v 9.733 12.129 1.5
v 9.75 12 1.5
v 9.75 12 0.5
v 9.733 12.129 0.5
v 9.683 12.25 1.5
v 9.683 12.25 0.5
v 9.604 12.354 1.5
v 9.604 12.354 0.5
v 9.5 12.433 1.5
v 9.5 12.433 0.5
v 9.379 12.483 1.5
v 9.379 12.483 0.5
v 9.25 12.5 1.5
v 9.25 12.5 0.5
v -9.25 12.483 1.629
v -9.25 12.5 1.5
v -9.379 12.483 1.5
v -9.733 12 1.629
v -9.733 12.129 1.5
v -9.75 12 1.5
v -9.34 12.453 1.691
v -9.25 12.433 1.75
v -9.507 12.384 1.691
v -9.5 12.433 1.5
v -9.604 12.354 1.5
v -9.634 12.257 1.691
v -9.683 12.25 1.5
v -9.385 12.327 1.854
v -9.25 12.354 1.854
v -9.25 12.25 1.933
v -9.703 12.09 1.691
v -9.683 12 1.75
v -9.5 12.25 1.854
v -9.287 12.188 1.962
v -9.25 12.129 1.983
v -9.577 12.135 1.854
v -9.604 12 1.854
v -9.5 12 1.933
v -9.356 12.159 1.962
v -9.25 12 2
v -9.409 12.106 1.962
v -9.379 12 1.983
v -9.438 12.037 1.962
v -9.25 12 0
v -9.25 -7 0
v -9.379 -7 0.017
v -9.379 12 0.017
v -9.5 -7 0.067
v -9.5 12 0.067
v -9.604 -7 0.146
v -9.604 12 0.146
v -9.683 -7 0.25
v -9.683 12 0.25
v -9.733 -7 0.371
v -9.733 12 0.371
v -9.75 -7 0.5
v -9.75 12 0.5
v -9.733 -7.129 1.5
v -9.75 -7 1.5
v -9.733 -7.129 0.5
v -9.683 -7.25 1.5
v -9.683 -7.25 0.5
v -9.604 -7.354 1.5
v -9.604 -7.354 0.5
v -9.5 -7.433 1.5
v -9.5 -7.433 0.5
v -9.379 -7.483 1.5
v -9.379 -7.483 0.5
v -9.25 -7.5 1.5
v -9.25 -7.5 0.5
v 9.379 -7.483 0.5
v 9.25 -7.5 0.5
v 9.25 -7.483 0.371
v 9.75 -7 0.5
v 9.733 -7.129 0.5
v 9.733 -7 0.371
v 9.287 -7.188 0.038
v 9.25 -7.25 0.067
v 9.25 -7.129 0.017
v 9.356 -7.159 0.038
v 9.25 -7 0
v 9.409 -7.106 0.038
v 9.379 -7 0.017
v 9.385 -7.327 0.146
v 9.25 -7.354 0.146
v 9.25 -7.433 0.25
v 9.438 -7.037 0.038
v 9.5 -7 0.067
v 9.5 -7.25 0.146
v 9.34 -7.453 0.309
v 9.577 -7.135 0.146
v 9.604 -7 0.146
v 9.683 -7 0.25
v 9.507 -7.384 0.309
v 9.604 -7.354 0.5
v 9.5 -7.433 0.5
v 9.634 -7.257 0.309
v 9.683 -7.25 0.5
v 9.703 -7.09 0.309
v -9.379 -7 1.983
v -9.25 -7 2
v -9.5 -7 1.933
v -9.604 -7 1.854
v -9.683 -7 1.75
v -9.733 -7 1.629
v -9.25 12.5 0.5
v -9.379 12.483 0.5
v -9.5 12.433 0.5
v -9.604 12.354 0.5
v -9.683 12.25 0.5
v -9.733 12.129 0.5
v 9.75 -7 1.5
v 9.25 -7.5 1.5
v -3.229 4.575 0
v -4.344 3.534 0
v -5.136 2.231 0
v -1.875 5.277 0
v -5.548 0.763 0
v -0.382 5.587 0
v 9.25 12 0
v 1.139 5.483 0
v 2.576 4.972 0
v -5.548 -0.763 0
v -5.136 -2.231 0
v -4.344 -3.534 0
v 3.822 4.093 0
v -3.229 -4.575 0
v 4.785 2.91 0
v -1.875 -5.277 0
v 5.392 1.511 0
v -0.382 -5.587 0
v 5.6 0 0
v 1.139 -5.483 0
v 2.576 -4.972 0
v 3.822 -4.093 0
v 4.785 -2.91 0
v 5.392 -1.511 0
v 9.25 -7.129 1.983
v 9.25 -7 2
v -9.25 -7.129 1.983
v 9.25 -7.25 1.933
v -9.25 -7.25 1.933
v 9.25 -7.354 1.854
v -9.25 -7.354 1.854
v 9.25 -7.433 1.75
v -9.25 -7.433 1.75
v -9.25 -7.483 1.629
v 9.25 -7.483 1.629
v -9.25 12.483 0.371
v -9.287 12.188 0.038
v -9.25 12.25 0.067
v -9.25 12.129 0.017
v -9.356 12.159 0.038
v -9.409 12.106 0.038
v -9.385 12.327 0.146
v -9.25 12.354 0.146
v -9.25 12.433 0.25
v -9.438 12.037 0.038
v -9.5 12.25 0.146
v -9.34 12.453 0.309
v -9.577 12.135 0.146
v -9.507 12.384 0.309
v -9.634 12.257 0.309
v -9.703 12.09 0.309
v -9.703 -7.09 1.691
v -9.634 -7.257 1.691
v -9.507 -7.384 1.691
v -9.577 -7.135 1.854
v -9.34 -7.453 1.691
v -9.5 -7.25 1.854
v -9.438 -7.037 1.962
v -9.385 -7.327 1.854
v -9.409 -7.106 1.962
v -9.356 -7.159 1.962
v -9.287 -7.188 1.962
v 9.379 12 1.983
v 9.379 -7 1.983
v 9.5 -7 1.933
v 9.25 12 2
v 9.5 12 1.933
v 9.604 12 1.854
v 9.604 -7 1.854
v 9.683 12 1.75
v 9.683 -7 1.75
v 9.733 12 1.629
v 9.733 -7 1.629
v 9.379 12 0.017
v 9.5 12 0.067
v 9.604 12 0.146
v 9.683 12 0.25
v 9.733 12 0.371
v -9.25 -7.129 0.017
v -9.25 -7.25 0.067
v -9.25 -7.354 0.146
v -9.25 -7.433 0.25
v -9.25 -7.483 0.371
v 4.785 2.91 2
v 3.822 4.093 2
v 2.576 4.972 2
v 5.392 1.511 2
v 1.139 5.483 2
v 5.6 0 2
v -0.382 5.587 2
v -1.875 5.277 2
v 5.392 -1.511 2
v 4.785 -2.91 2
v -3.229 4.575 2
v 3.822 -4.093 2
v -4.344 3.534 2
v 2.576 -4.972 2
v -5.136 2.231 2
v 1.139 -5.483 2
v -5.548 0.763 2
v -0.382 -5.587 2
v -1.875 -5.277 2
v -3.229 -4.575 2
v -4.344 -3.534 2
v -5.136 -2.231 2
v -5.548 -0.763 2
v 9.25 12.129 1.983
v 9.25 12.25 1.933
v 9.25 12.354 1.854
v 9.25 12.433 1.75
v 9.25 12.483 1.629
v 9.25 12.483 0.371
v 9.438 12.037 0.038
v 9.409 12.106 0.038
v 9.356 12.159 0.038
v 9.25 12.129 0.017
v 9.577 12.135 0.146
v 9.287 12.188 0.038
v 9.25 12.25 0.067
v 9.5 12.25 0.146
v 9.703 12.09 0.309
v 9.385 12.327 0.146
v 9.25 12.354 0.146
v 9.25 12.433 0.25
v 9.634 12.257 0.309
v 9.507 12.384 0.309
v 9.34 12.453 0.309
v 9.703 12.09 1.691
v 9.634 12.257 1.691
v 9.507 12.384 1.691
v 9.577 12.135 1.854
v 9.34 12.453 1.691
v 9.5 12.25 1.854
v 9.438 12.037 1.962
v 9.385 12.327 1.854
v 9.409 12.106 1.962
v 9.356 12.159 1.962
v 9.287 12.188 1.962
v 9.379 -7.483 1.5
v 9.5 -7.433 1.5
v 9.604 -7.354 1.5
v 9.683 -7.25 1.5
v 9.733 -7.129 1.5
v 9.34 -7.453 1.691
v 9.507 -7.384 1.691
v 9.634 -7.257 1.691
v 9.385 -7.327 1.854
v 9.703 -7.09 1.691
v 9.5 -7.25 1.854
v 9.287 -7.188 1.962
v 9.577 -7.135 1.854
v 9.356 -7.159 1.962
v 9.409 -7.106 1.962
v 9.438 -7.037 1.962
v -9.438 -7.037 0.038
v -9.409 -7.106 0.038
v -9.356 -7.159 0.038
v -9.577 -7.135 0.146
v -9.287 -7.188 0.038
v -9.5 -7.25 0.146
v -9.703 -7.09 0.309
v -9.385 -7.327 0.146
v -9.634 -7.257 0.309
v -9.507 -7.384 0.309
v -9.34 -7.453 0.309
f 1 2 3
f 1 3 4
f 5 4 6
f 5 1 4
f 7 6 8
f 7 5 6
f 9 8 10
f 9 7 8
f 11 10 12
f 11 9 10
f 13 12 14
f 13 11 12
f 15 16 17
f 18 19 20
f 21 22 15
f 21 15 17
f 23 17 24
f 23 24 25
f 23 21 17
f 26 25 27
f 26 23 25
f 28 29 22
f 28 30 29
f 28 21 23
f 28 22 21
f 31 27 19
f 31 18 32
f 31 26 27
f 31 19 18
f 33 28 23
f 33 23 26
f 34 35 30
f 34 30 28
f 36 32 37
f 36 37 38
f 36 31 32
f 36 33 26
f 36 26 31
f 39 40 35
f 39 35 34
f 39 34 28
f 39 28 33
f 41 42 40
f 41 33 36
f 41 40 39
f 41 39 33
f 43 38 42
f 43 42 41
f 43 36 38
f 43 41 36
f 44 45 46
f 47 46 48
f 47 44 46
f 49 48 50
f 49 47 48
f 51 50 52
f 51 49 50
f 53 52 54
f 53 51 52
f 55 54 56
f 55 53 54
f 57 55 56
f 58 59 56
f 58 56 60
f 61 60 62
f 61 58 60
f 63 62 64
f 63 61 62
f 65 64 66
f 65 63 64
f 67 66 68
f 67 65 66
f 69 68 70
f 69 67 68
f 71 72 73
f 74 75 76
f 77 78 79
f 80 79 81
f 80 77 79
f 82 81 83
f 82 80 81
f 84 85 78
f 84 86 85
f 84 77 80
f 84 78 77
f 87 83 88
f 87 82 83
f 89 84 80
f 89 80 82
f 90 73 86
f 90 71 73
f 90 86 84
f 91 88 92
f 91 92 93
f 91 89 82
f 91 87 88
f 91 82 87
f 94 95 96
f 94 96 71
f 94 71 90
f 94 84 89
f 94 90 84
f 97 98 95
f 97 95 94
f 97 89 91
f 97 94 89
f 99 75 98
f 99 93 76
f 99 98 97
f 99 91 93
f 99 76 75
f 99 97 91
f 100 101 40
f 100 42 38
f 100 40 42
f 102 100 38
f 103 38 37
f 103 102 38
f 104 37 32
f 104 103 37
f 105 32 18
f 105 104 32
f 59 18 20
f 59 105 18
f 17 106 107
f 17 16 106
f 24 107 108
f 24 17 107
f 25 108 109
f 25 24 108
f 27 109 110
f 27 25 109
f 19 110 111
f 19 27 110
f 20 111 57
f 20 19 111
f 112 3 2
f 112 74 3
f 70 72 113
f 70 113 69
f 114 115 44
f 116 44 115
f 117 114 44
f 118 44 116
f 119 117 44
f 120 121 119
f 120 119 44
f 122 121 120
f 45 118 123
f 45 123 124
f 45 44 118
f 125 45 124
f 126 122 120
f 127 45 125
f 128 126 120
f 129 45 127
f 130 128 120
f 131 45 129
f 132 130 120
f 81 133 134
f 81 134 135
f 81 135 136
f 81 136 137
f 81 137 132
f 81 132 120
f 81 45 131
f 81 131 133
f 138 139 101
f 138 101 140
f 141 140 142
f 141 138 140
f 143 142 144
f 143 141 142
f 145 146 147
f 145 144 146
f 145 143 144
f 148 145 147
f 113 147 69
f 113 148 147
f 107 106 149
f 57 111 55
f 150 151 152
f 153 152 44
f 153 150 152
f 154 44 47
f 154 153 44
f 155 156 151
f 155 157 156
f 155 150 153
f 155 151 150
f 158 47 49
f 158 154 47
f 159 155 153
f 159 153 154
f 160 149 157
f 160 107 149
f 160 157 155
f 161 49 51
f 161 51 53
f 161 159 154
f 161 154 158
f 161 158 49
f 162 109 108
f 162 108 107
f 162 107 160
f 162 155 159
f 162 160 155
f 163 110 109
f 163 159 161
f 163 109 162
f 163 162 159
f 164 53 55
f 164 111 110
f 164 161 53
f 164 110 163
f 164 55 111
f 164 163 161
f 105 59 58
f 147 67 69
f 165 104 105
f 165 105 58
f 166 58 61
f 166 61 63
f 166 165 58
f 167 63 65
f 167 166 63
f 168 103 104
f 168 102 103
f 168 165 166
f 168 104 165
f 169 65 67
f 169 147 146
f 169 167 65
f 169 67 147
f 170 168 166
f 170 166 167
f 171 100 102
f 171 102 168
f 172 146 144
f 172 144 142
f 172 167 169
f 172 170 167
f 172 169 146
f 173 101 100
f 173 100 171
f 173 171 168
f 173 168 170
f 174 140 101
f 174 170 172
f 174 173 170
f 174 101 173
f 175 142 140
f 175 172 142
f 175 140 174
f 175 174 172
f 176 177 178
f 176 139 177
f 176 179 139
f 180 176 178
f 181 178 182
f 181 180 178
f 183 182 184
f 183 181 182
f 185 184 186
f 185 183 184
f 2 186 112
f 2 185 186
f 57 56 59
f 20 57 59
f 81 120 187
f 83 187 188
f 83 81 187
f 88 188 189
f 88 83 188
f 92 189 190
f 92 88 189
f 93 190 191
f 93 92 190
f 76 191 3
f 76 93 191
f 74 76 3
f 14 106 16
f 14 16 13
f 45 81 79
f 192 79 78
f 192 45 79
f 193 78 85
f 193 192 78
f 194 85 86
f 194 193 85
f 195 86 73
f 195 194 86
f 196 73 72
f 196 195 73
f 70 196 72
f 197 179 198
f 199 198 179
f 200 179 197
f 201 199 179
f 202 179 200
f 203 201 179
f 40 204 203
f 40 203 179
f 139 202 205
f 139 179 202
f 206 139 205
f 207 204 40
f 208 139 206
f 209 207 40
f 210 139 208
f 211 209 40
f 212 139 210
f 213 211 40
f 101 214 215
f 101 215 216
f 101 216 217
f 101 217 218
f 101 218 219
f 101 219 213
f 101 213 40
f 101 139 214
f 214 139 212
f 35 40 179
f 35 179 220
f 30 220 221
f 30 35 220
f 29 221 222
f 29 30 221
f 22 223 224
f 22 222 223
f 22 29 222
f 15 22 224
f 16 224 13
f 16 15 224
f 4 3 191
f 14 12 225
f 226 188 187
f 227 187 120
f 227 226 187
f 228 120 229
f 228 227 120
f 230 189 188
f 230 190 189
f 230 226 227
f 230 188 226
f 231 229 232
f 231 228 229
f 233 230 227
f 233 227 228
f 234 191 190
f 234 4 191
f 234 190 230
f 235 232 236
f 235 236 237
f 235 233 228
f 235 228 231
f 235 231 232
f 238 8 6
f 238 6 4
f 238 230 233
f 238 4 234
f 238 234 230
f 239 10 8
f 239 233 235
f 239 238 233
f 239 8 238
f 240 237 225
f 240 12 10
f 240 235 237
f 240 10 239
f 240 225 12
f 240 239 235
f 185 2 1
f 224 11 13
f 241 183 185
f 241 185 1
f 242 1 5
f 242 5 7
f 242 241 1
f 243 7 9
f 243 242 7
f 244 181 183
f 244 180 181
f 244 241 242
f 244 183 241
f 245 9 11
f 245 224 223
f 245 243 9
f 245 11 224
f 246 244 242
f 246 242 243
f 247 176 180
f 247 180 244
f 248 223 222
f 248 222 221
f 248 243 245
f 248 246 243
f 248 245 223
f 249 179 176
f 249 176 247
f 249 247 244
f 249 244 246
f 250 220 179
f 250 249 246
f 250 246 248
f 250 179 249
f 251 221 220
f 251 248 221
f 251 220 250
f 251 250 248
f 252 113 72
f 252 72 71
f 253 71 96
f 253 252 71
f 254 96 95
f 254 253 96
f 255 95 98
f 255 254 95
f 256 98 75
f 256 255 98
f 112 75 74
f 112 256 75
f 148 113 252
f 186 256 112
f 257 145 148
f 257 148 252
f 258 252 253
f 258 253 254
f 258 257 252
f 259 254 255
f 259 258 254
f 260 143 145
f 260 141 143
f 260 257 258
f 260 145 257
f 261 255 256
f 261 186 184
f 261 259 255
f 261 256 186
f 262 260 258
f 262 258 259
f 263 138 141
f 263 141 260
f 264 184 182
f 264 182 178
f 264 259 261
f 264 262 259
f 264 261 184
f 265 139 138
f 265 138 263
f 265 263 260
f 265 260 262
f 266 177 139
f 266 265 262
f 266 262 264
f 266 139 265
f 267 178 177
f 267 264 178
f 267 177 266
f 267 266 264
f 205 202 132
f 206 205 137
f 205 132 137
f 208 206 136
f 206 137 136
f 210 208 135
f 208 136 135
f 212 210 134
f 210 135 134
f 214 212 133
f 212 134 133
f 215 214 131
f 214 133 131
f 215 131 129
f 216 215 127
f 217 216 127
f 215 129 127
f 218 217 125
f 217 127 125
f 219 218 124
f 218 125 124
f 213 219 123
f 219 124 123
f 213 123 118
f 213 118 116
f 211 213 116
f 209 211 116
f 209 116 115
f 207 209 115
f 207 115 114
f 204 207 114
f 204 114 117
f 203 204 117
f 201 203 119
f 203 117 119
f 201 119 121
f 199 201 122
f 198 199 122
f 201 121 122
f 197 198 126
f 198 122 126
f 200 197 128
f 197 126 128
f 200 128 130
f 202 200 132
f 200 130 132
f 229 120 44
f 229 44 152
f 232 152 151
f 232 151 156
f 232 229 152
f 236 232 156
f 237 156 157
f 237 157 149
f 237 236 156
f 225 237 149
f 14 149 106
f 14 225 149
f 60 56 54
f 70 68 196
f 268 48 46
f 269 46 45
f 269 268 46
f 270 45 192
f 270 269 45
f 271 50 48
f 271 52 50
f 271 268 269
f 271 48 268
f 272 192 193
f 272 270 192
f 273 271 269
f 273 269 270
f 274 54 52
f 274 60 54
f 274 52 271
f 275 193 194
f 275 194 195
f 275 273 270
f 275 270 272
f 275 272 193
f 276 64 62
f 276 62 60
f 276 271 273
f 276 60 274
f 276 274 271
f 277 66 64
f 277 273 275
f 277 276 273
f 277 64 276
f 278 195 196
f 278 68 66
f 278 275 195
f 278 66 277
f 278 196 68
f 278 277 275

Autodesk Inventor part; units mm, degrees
ref_plane "YZ Plane" through (0, 0, 0) normal (1, 0, 0) x (0, 1, 0)
ref_plane "XZ Plane" through (0, 0, 0) normal (0, 1, 0) x (-1, 0, 0)
ref_plane "XY Plane" through (0, 0, 0) normal (0, 0, 1) x (1, 0, 0)
sketch "Sketch1" plane through (0, 0, 0) normal (0, 0, 1) x (1, 0, 0)
  line L0 (-9.75, -4.725) -> (-9.75, 4.725) projected
  line L1 (9.75, 4.725) -> (9.75, -4.725) projected
  circle A0 centre (0, 0) radius 5.6
  line L2 (0, 0) -> (0, 7.5)
  line L3 (0, 0) -> (0, -7.5)
  line L4 (-9.75, 7.5) -> (9.75, 7.5)
  line L5 (9.75, 7.5) -> (9.75, -7.5)
  line L6 (9.75, -7.5) -> (-9.75, -7.5)
  line L7 (-9.75, -7.5) -> (-9.75, 7.5)
  point P0 (0, 0)
  dimension "d0" = 11.2
  dimension "d5" = 7.5
  dimension "d6" = 7.5
extrude "Extrusion1" add sketch "Sketch1" along normal blind 2 contours L0 L7 L4 L2 A0 L3 L6 | L3 A0 L2 L4 L5 L1 L6
sketch "Sketch2" plane through (-9.75, 7.5, 0) normal (0, 1, 0) x (1, 0, 0)
  line L0 (0, 0) -> (19.5, 0) projected
  line L1 (0, 0) -> (0, -2) projected
  line L2 (19.5, -2) -> (0, -2) projected
  line L3 (19.5, 0) -> (19.5, -2) projected
  point P0 (9.75, 0)
extrude "Extrusion2" add sketch "Sketch2" along normal blind 5
fillet "Fillet3" radius 0.5 4 edges at (-9.75, 12.5, 1) (9.75, 12.5, 1) (-9.75, -7.5, 1) (9.75, -7.5, 1)
fillet "Fillet4" radius 0.5 12 edges at (0, 12.5, 0) (9.75, 2.5, 0) (9.6036, -7.3536, 0) (0, -7.5, 0) (-9.6036, -7.3536, 0) (-9.75, 2.5, 0) (0, 12.5, 2) (9.75, 2.5, 2) (9.6036, -7.3536, 2) (0, -7.5, 2) (-9.6036, -7.3536, 2) (-9.75, 2.5, 2)
properties part number "SyringeAttachment"
